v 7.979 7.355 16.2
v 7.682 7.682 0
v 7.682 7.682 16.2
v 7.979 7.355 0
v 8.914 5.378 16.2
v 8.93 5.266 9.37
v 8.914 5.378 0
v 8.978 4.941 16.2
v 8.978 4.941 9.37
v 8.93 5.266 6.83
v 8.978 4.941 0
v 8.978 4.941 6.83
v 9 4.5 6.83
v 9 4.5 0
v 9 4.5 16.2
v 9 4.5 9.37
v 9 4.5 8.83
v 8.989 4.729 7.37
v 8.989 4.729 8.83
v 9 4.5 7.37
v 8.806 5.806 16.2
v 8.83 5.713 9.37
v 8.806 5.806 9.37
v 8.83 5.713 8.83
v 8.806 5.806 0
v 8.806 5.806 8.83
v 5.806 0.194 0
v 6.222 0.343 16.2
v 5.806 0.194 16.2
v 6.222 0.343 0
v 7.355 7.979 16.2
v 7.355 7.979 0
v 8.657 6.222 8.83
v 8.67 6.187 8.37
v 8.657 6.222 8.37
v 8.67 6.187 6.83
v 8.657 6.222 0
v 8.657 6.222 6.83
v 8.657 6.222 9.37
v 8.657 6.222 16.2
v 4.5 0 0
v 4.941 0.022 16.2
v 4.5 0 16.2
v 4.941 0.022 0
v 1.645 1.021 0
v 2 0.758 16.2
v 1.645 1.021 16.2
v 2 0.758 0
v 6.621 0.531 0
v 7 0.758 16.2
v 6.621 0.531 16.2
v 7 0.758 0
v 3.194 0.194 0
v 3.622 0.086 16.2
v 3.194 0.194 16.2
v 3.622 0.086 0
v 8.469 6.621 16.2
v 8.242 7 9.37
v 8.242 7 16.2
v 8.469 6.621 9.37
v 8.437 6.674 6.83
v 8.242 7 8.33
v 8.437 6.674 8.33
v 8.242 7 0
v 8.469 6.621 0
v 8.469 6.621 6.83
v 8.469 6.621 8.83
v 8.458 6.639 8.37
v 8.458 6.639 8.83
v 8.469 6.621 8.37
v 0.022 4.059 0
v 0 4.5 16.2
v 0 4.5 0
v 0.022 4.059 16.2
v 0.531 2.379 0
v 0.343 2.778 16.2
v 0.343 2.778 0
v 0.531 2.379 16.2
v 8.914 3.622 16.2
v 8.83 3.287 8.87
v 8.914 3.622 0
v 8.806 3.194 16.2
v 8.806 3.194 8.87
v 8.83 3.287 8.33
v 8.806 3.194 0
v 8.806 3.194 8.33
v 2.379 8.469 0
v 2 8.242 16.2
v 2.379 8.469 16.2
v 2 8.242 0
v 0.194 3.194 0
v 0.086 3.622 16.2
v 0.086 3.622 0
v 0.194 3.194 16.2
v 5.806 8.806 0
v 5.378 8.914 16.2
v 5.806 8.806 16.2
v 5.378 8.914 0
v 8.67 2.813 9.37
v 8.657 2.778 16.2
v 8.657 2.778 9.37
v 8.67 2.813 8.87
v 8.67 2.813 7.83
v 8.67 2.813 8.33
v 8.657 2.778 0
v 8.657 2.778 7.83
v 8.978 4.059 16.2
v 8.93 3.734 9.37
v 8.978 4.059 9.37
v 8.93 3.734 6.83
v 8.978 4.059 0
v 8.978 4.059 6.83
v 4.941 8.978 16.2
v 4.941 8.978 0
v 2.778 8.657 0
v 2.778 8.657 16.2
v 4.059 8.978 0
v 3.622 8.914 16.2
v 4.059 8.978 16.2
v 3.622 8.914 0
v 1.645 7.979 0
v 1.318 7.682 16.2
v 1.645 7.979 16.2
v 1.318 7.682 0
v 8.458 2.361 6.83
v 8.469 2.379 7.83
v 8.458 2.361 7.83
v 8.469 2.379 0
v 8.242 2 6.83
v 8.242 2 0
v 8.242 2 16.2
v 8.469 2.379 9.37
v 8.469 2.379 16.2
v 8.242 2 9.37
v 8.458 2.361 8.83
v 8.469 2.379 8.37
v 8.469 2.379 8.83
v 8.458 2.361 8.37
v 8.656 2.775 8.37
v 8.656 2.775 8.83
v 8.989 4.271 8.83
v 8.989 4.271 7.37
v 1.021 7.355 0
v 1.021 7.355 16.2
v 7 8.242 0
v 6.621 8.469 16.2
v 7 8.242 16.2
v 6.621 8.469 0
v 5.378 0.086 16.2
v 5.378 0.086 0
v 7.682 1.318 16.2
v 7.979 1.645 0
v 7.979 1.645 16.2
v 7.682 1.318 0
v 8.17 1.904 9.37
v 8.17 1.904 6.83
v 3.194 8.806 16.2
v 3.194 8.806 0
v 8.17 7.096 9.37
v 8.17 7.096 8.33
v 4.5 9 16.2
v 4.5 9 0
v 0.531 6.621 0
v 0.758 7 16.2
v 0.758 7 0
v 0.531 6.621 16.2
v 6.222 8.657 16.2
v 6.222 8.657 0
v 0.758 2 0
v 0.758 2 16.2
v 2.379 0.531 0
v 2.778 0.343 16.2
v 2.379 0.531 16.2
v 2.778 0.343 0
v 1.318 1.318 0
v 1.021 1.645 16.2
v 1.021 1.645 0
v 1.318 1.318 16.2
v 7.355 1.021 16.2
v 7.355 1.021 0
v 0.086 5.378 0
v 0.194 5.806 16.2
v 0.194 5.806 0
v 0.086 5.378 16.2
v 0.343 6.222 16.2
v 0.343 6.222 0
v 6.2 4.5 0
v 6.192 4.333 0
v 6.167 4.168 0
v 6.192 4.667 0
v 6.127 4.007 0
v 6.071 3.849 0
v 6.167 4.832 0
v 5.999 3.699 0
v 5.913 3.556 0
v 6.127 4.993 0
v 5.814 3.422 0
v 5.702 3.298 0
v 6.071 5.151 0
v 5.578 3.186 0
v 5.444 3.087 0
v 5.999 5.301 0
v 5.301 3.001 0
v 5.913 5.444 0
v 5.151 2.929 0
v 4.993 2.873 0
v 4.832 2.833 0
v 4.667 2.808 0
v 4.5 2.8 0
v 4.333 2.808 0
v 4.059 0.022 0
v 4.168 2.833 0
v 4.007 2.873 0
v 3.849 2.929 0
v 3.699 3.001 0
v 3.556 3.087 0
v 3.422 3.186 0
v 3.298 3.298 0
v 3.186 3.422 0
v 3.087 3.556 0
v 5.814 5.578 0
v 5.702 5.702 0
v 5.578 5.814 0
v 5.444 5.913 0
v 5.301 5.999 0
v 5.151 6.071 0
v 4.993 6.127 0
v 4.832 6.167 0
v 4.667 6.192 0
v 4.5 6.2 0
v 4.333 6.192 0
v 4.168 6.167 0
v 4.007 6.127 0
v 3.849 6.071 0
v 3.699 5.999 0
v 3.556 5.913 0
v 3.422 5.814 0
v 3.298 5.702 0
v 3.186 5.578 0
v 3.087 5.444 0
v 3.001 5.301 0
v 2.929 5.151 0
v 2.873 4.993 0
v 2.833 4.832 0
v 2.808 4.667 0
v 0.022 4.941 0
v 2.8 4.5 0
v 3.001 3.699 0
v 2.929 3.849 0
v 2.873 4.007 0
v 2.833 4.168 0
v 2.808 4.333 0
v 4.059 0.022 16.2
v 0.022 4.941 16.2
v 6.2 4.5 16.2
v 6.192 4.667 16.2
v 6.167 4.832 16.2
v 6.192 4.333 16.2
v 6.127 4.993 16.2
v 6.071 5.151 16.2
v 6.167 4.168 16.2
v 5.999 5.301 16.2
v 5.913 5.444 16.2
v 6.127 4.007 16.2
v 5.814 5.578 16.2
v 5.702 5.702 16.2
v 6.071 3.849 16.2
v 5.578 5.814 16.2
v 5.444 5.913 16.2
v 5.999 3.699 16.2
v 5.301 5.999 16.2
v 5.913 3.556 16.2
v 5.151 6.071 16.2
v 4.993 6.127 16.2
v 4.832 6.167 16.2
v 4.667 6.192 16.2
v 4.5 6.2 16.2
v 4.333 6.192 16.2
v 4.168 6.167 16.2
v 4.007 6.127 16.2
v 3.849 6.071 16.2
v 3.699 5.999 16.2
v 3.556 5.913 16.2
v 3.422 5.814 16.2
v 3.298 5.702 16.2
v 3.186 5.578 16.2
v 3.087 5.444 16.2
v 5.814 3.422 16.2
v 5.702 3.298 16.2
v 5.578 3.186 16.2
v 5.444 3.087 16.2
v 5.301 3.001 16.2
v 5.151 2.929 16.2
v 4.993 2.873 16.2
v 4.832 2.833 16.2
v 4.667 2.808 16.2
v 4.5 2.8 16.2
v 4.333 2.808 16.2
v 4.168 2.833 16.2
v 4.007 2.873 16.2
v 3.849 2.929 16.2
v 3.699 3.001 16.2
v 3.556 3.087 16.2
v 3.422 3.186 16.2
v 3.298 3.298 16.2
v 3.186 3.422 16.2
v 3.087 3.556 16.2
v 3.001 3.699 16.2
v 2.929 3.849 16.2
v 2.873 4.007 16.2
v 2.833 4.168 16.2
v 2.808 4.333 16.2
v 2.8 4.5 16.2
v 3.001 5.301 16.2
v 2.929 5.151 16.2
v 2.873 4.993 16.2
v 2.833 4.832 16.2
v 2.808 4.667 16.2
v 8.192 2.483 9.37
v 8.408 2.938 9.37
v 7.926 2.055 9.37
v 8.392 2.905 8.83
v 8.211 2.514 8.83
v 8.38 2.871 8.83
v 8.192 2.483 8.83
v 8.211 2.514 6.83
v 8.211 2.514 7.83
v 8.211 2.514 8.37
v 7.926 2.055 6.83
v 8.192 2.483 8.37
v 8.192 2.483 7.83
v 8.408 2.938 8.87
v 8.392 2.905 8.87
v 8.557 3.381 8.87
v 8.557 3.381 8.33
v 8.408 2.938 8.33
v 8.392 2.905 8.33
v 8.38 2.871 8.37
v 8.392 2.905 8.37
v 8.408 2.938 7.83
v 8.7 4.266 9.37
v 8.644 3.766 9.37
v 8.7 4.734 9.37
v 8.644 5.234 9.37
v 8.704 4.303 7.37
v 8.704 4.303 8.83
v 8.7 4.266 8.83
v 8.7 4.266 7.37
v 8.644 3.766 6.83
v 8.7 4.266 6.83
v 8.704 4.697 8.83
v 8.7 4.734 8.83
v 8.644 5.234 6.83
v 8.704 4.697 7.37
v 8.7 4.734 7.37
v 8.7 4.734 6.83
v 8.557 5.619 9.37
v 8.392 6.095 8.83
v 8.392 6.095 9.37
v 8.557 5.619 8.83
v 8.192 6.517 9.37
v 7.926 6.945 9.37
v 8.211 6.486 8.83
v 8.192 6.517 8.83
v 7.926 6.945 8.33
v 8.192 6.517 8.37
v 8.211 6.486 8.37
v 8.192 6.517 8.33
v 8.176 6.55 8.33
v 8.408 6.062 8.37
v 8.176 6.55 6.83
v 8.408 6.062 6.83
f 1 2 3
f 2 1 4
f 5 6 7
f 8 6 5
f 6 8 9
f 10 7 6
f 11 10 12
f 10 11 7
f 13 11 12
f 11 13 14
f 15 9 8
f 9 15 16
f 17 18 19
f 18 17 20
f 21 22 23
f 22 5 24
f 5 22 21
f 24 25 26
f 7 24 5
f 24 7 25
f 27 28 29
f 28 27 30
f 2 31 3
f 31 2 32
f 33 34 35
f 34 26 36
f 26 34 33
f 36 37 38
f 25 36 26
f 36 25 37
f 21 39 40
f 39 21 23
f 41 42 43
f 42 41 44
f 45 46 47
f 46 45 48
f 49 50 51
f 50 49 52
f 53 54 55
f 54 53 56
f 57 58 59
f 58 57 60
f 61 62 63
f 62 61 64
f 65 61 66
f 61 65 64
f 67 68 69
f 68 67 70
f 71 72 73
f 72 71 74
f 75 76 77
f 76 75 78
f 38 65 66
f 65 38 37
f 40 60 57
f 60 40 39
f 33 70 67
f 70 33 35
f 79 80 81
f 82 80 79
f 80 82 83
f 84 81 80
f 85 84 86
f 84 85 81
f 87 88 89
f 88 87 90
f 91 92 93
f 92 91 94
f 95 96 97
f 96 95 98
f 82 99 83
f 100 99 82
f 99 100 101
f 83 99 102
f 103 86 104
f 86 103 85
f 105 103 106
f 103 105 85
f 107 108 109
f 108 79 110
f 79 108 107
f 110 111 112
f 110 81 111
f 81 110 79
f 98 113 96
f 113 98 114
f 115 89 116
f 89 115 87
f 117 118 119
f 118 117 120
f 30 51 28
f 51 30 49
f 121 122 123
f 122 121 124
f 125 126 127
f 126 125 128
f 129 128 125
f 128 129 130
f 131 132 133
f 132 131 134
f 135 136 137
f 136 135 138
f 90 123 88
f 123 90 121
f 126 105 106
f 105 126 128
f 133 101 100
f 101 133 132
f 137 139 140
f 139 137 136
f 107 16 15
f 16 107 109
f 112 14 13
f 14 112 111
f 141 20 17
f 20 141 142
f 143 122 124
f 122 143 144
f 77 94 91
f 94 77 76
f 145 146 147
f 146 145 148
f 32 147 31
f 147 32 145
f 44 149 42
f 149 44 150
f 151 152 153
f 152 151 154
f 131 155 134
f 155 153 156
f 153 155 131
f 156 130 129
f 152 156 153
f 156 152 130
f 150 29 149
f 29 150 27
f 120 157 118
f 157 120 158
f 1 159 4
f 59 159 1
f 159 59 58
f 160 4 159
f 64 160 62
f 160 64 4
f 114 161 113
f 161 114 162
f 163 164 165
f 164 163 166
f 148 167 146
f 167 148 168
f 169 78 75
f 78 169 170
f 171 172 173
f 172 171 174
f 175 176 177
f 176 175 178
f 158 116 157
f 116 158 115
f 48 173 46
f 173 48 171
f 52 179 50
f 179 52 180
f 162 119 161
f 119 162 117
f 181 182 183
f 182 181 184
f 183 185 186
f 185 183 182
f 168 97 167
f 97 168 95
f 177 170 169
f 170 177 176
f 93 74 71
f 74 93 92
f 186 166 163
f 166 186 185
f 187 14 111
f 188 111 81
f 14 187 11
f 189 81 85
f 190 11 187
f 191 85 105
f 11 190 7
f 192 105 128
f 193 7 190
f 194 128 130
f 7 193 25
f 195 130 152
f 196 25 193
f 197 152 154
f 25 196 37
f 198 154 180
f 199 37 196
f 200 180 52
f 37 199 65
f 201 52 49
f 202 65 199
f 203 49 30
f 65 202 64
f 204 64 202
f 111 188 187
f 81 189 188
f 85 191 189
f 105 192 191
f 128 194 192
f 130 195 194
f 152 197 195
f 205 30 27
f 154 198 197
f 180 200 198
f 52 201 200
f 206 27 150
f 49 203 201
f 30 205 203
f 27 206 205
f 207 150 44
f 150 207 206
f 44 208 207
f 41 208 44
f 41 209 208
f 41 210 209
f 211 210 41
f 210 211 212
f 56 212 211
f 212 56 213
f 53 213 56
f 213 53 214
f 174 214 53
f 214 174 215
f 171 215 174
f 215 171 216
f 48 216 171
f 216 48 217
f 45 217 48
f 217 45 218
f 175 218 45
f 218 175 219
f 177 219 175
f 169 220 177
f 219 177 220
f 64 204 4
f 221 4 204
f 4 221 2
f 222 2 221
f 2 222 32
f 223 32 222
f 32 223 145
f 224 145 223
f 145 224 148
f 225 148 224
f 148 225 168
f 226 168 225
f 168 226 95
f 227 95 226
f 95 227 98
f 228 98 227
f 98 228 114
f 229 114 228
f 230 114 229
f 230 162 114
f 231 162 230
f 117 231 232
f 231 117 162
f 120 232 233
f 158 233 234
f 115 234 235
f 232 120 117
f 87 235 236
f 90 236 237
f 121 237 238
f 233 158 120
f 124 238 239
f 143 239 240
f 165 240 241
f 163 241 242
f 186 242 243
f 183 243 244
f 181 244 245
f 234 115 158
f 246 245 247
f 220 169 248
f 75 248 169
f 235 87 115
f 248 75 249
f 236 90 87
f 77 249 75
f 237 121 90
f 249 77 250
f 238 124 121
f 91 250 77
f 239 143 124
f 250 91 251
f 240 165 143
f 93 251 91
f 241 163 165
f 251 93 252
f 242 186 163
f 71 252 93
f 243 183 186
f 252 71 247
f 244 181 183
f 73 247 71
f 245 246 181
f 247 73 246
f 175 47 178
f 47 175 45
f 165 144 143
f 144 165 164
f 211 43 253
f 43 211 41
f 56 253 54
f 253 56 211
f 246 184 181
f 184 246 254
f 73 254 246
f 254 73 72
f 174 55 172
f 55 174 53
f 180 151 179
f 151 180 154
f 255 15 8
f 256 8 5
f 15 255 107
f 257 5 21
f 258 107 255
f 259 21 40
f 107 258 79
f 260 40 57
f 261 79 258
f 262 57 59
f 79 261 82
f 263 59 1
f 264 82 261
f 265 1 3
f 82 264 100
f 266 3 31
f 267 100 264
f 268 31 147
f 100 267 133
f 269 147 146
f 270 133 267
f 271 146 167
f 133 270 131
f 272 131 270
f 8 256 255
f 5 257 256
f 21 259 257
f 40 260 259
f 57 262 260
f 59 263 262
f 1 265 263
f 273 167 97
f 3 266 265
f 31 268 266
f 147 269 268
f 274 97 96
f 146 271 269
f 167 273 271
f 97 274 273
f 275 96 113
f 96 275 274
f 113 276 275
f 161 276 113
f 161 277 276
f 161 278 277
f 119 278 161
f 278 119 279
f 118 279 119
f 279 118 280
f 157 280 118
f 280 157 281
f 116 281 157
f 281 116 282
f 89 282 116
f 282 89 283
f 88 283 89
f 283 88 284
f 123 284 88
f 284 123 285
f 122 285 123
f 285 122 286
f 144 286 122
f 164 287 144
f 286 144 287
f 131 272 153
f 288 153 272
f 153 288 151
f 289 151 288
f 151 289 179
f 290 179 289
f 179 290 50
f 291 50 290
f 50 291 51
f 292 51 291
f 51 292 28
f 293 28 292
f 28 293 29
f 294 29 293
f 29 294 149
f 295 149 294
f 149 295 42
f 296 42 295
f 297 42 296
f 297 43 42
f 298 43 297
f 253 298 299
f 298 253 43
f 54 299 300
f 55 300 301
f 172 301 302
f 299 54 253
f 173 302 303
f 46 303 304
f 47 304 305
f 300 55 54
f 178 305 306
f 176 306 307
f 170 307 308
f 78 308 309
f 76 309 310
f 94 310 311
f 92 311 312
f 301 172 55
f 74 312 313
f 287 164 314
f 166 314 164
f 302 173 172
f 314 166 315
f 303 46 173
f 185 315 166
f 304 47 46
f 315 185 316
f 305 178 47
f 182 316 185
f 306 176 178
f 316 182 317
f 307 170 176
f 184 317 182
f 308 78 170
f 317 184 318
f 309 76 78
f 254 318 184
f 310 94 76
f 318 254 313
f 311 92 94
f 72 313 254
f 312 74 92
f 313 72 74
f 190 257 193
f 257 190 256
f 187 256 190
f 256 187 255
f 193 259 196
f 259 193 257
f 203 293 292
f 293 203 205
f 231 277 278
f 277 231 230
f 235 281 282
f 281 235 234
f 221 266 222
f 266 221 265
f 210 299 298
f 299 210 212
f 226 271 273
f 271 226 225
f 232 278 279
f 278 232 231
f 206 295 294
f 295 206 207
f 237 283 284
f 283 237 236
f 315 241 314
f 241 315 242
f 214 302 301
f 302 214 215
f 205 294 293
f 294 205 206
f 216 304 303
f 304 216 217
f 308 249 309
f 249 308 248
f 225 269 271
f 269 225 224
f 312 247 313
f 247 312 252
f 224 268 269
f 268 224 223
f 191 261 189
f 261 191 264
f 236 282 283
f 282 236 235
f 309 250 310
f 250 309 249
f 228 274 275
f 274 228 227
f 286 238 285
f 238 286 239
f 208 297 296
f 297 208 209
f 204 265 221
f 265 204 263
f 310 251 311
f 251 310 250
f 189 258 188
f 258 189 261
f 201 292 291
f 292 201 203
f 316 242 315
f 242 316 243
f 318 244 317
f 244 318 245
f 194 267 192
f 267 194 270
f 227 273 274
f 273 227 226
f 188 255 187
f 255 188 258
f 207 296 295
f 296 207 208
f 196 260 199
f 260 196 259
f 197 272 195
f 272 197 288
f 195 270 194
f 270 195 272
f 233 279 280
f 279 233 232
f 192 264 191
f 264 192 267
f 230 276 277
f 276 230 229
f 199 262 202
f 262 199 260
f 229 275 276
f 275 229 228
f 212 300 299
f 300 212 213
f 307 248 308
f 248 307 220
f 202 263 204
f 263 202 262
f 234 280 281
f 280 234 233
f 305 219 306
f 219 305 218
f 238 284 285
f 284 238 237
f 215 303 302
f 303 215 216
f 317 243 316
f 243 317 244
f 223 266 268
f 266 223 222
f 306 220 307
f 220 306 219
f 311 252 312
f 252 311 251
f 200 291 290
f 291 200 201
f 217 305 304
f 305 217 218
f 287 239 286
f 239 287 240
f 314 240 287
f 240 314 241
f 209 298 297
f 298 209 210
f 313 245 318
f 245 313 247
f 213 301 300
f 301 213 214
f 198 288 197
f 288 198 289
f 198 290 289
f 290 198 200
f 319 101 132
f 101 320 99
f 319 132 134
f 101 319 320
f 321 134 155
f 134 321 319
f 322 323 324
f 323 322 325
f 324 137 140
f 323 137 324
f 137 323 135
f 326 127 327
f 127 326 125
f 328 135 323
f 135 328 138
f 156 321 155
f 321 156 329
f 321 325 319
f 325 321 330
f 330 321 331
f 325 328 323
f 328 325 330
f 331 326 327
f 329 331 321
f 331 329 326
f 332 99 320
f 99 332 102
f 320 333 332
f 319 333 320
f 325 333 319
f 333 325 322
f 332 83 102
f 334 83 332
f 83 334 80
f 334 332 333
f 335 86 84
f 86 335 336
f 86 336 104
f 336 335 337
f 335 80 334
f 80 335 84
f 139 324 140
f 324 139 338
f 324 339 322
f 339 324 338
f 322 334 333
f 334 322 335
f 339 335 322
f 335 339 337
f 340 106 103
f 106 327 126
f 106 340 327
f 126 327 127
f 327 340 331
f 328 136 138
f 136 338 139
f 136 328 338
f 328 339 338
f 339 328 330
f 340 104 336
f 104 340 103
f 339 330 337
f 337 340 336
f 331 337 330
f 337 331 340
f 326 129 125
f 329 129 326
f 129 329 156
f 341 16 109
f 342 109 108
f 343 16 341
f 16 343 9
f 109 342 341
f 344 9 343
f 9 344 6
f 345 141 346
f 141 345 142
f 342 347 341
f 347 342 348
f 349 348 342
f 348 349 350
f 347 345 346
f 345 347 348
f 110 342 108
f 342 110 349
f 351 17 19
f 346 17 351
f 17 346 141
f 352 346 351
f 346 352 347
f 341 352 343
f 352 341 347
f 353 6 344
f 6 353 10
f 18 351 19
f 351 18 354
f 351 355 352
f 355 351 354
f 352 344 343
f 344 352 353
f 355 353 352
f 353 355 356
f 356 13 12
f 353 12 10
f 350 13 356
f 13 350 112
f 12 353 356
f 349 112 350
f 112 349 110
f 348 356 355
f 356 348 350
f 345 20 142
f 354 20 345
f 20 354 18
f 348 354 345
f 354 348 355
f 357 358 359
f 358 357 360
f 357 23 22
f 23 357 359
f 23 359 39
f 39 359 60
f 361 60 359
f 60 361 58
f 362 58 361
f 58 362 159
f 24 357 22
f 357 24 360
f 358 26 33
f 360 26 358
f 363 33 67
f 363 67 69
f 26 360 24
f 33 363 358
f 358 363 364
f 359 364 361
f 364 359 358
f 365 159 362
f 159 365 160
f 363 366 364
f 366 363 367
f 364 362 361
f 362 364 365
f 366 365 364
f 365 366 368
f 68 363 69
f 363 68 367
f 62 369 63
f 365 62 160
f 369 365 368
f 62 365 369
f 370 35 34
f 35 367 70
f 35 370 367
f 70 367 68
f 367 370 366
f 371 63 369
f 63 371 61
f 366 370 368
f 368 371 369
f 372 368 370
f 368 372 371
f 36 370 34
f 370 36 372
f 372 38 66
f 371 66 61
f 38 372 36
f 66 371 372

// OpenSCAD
// 牌倉支柱
$fn=64;
translate([4.5,4.5,-45.4]){rotate([0,0,0]){difference(){difference(){translate([0,0,45.4]){cylinder(h=16.2,d1=9,d2=9,$fn=64);}translate([0,0,44.5]){cylinder(h=18,d1=3.4,d2=3.4,$fn=64);}}union(){union(){union(){union(){union(){union(){union(){union(){union(){union(){union(){union(){union(){union(){union(){union(){union(){union(){union(){union(){union(){union(){union(){union(){union(){union(){multmatrix([[0.52742,0,0.84961,3.82323],[0.84961,0,-0.52742,-2.37337],[0,1,0,54.5],[0,0,0,1]]){translate([-0.27,-0.27,-0.3]){cube([0.54,0.54,0.42]);}}multmatrix([[0.42996,0,0.90285,4.06282],[0.90285,0,-0.42996,-1.9348],[0,1,0,54.5],[0,0,0,1]]){translate([-0.27,-0.27,-0.3]){cube([0.54,0.54,0.42]);}}}multmatrix([[0.52742,0,0.84961,3.82323],[0.84961,0,-0.52742,-2.37337],[0,1,0,54],[0,0,0,1]]){translate([-0.27,-0.27,-0.3]){cube([0.54,0.54,0.42]);}}}multmatrix([[0.32719,0,0.94496,4.25231],[0.94496,0,-0.32719,-1.47238],[0,1,0,54],[0,0,0,1]]){translate([-0.27,-0.27,-0.3]){cube([0.54,0.54,0.42]);}}}multmatrix([[0.52742,0,0.84961,3.82323],[0.84961,0,-0.52742,-2.37337],[0,1,0,53.5],[0,0,0,1]]){translate([-0.27,-0.27,-0.3]){cube([0.54,0.54,0.42]);}}}multmatrix([[0.42996,0,0.90285,4.06282],[0.90285,0,-0.42996,-1.9348],[0,1,0,53.5],[0,0,0,1]]){translate([-0.27,-0.27,-0.3]){cube([0.54,0.54,0.42]);}}}multmatrix([[0.52742,0,0.84961,3.82323],[0.84961,0,-0.52742,-2.37337],[0,1,0,53],[0,0,0,1]]){translate([-0.27,-0.27,-0.3]){cube([0.54,0.54,0.42]);}}}multmatrix([[0.52742,0,0.84961,3.82323],[0.84961,0,-0.52742,-2.37337],[0,1,0,52.5],[0,0,0,1]]){translate([-0.27,-0.27,-0.3]){cube([0.54,0.54,0.42]);}}}multmatrix([[0.11088,0,0.99383,4.47225],[0.99383,0,-0.11088,-0.49897],[0,1,0,54.5],[0,0,0,1]]){translate([-0.27,-0.27,-0.3]){cube([0.54,0.54,0.42]);}}}multmatrix([[-0,0,1,4.5],[1,0,0,0],[0,1,0,54.5],[0,0,0,1]]){translate([-0.27,-0.27,-0.3]){cube([0.54,0.54,0.42]);}}}multmatrix([[-0.11088,0,0.99383,4.47225],[0.99383,0,0.11088,0.49897],[0,1,0,54.5],[0,0,0,1]]){translate([-0.27,-0.27,-0.3]){cube([0.54,0.54,0.42]);}}}multmatrix([[0.11088,0,0.99383,4.47225],[0.99383,0,-0.11088,-0.49897],[0,1,0,54],[0,0,0,1]]){translate([-0.27,-0.27,-0.3]){cube([0.54,0.54,0.42]);}}}multmatrix([[-0.11088,0,0.99383,4.47225],[0.99383,0,0.11088,0.49897],[0,1,0,54],[0,0,0,1]]){translate([-0.27,-0.27,-0.3]){cube([0.54,0.54,0.42]);}}}multmatrix([[0.11088,0,0.99383,4.47225],[0.99383,0,-0.11088,-0.49897],[0,1,0,53.5],[0,0,0,1]]){translate([-0.27,-0.27,-0.3]){cube([0.54,0.54,0.42]);}}}multmatrix([[-0.11088,0,0.99383,4.47225],[0.99383,0,0.11088,0.49897],[0,1,0,53.5],[0,0,0,1]]){translate([-0.27,-0.27,-0.3]){cube([0.54,0.54,0.42]);}}}multmatrix([[0.11088,0,0.99383,4.47225],[0.99383,0,-0.11088,-0.49897],[0,1,0,53],[0,0,0,1]]){translate([-0.27,-0.27,-0.3]){cube([0.54,0.54,0.42]);}}}multmatrix([[-0.11088,0,0.99383,4.47225],[0.99383,0,0.11088,0.49897],[0,1,0,53],[0,0,0,1]]){translate([-0.27,-0.27,-0.3]){cube([0.54,0.54,0.42]);}}}multmatrix([[0.11088,0,0.99383,4.47225],[0.99383,0,-0.11088,-0.49897],[0,1,0,52.5],[0,0,0,1]]){translate([-0.27,-0.27,-0.3]){cube([0.54,0.54,0.42]);}}}multmatrix([[-0,0,1,4.5],[1,0,0,0],[0,1,0,52.5],[0,0,0,1]]){translate([-0.27,-0.27,-0.3]){cube([0.54,0.54,0.42]);}}}multmatrix([[-0.11088,0,0.99383,4.47225],[0.99383,0,0.11088,0.49897],[0,1,0,52.5],[0,0,0,1]]){translate([-0.27,-0.27,-0.3]){cube([0.54,0.54,0.42]);}}}multmatrix([[-0.32719,0,0.94496,4.25231],[0.94496,0,0.32719,1.47238],[0,1,0,54.5],[0,0,0,1]]){translate([-0.27,-0.27,-0.3]){cube([0.54,0.54,0.42]);}}}multmatrix([[-0.42996,0,0.90285,4.06282],[0.90285,0,0.42996,1.9348],[0,1,0,54.5],[0,0,0,1]]){translate([-0.27,-0.27,-0.3]){cube([0.54,0.54,0.42]);}}}multmatrix([[-0.52742,0,0.84961,3.82323],[0.84961,0,0.52742,2.37337],[0,1,0,54.5],[0,0,0,1]]){translate([-0.27,-0.27,-0.3]){cube([0.54,0.54,0.42]);}}}multmatrix([[-0.52742,0,0.84961,3.82323],[0.84961,0,0.52742,2.37337],[0,1,0,54],[0,0,0,1]]){translate([-0.27,-0.27,-0.3]){cube([0.54,0.54,0.42]);}}}multmatrix([[-0.42996,0,0.90285,4.06282],[0.90285,0,0.42996,1.9348],[0,1,0,53.5],[0,0,0,1]]){translate([-0.27,-0.27,-0.3]){cube([0.54,0.54,0.42]);}}}multmatrix([[-0.42996,0,0.90285,4.06282],[0.90285,0,0.42996,1.9348],[0,1,0,53],[0,0,0,1]]){translate([-0.27,-0.27,-0.3]){cube([0.54,0.54,0.42]);}}}multmatrix([[-0.42996,0,0.90285,4.06282],[0.90285,0,0.42996,1.9348],[0,1,0,52.5],[0,0,0,1]]){translate([-0.27,-0.27,-0.3]){cube([0.54,0.54,0.42]);}}}}}}
